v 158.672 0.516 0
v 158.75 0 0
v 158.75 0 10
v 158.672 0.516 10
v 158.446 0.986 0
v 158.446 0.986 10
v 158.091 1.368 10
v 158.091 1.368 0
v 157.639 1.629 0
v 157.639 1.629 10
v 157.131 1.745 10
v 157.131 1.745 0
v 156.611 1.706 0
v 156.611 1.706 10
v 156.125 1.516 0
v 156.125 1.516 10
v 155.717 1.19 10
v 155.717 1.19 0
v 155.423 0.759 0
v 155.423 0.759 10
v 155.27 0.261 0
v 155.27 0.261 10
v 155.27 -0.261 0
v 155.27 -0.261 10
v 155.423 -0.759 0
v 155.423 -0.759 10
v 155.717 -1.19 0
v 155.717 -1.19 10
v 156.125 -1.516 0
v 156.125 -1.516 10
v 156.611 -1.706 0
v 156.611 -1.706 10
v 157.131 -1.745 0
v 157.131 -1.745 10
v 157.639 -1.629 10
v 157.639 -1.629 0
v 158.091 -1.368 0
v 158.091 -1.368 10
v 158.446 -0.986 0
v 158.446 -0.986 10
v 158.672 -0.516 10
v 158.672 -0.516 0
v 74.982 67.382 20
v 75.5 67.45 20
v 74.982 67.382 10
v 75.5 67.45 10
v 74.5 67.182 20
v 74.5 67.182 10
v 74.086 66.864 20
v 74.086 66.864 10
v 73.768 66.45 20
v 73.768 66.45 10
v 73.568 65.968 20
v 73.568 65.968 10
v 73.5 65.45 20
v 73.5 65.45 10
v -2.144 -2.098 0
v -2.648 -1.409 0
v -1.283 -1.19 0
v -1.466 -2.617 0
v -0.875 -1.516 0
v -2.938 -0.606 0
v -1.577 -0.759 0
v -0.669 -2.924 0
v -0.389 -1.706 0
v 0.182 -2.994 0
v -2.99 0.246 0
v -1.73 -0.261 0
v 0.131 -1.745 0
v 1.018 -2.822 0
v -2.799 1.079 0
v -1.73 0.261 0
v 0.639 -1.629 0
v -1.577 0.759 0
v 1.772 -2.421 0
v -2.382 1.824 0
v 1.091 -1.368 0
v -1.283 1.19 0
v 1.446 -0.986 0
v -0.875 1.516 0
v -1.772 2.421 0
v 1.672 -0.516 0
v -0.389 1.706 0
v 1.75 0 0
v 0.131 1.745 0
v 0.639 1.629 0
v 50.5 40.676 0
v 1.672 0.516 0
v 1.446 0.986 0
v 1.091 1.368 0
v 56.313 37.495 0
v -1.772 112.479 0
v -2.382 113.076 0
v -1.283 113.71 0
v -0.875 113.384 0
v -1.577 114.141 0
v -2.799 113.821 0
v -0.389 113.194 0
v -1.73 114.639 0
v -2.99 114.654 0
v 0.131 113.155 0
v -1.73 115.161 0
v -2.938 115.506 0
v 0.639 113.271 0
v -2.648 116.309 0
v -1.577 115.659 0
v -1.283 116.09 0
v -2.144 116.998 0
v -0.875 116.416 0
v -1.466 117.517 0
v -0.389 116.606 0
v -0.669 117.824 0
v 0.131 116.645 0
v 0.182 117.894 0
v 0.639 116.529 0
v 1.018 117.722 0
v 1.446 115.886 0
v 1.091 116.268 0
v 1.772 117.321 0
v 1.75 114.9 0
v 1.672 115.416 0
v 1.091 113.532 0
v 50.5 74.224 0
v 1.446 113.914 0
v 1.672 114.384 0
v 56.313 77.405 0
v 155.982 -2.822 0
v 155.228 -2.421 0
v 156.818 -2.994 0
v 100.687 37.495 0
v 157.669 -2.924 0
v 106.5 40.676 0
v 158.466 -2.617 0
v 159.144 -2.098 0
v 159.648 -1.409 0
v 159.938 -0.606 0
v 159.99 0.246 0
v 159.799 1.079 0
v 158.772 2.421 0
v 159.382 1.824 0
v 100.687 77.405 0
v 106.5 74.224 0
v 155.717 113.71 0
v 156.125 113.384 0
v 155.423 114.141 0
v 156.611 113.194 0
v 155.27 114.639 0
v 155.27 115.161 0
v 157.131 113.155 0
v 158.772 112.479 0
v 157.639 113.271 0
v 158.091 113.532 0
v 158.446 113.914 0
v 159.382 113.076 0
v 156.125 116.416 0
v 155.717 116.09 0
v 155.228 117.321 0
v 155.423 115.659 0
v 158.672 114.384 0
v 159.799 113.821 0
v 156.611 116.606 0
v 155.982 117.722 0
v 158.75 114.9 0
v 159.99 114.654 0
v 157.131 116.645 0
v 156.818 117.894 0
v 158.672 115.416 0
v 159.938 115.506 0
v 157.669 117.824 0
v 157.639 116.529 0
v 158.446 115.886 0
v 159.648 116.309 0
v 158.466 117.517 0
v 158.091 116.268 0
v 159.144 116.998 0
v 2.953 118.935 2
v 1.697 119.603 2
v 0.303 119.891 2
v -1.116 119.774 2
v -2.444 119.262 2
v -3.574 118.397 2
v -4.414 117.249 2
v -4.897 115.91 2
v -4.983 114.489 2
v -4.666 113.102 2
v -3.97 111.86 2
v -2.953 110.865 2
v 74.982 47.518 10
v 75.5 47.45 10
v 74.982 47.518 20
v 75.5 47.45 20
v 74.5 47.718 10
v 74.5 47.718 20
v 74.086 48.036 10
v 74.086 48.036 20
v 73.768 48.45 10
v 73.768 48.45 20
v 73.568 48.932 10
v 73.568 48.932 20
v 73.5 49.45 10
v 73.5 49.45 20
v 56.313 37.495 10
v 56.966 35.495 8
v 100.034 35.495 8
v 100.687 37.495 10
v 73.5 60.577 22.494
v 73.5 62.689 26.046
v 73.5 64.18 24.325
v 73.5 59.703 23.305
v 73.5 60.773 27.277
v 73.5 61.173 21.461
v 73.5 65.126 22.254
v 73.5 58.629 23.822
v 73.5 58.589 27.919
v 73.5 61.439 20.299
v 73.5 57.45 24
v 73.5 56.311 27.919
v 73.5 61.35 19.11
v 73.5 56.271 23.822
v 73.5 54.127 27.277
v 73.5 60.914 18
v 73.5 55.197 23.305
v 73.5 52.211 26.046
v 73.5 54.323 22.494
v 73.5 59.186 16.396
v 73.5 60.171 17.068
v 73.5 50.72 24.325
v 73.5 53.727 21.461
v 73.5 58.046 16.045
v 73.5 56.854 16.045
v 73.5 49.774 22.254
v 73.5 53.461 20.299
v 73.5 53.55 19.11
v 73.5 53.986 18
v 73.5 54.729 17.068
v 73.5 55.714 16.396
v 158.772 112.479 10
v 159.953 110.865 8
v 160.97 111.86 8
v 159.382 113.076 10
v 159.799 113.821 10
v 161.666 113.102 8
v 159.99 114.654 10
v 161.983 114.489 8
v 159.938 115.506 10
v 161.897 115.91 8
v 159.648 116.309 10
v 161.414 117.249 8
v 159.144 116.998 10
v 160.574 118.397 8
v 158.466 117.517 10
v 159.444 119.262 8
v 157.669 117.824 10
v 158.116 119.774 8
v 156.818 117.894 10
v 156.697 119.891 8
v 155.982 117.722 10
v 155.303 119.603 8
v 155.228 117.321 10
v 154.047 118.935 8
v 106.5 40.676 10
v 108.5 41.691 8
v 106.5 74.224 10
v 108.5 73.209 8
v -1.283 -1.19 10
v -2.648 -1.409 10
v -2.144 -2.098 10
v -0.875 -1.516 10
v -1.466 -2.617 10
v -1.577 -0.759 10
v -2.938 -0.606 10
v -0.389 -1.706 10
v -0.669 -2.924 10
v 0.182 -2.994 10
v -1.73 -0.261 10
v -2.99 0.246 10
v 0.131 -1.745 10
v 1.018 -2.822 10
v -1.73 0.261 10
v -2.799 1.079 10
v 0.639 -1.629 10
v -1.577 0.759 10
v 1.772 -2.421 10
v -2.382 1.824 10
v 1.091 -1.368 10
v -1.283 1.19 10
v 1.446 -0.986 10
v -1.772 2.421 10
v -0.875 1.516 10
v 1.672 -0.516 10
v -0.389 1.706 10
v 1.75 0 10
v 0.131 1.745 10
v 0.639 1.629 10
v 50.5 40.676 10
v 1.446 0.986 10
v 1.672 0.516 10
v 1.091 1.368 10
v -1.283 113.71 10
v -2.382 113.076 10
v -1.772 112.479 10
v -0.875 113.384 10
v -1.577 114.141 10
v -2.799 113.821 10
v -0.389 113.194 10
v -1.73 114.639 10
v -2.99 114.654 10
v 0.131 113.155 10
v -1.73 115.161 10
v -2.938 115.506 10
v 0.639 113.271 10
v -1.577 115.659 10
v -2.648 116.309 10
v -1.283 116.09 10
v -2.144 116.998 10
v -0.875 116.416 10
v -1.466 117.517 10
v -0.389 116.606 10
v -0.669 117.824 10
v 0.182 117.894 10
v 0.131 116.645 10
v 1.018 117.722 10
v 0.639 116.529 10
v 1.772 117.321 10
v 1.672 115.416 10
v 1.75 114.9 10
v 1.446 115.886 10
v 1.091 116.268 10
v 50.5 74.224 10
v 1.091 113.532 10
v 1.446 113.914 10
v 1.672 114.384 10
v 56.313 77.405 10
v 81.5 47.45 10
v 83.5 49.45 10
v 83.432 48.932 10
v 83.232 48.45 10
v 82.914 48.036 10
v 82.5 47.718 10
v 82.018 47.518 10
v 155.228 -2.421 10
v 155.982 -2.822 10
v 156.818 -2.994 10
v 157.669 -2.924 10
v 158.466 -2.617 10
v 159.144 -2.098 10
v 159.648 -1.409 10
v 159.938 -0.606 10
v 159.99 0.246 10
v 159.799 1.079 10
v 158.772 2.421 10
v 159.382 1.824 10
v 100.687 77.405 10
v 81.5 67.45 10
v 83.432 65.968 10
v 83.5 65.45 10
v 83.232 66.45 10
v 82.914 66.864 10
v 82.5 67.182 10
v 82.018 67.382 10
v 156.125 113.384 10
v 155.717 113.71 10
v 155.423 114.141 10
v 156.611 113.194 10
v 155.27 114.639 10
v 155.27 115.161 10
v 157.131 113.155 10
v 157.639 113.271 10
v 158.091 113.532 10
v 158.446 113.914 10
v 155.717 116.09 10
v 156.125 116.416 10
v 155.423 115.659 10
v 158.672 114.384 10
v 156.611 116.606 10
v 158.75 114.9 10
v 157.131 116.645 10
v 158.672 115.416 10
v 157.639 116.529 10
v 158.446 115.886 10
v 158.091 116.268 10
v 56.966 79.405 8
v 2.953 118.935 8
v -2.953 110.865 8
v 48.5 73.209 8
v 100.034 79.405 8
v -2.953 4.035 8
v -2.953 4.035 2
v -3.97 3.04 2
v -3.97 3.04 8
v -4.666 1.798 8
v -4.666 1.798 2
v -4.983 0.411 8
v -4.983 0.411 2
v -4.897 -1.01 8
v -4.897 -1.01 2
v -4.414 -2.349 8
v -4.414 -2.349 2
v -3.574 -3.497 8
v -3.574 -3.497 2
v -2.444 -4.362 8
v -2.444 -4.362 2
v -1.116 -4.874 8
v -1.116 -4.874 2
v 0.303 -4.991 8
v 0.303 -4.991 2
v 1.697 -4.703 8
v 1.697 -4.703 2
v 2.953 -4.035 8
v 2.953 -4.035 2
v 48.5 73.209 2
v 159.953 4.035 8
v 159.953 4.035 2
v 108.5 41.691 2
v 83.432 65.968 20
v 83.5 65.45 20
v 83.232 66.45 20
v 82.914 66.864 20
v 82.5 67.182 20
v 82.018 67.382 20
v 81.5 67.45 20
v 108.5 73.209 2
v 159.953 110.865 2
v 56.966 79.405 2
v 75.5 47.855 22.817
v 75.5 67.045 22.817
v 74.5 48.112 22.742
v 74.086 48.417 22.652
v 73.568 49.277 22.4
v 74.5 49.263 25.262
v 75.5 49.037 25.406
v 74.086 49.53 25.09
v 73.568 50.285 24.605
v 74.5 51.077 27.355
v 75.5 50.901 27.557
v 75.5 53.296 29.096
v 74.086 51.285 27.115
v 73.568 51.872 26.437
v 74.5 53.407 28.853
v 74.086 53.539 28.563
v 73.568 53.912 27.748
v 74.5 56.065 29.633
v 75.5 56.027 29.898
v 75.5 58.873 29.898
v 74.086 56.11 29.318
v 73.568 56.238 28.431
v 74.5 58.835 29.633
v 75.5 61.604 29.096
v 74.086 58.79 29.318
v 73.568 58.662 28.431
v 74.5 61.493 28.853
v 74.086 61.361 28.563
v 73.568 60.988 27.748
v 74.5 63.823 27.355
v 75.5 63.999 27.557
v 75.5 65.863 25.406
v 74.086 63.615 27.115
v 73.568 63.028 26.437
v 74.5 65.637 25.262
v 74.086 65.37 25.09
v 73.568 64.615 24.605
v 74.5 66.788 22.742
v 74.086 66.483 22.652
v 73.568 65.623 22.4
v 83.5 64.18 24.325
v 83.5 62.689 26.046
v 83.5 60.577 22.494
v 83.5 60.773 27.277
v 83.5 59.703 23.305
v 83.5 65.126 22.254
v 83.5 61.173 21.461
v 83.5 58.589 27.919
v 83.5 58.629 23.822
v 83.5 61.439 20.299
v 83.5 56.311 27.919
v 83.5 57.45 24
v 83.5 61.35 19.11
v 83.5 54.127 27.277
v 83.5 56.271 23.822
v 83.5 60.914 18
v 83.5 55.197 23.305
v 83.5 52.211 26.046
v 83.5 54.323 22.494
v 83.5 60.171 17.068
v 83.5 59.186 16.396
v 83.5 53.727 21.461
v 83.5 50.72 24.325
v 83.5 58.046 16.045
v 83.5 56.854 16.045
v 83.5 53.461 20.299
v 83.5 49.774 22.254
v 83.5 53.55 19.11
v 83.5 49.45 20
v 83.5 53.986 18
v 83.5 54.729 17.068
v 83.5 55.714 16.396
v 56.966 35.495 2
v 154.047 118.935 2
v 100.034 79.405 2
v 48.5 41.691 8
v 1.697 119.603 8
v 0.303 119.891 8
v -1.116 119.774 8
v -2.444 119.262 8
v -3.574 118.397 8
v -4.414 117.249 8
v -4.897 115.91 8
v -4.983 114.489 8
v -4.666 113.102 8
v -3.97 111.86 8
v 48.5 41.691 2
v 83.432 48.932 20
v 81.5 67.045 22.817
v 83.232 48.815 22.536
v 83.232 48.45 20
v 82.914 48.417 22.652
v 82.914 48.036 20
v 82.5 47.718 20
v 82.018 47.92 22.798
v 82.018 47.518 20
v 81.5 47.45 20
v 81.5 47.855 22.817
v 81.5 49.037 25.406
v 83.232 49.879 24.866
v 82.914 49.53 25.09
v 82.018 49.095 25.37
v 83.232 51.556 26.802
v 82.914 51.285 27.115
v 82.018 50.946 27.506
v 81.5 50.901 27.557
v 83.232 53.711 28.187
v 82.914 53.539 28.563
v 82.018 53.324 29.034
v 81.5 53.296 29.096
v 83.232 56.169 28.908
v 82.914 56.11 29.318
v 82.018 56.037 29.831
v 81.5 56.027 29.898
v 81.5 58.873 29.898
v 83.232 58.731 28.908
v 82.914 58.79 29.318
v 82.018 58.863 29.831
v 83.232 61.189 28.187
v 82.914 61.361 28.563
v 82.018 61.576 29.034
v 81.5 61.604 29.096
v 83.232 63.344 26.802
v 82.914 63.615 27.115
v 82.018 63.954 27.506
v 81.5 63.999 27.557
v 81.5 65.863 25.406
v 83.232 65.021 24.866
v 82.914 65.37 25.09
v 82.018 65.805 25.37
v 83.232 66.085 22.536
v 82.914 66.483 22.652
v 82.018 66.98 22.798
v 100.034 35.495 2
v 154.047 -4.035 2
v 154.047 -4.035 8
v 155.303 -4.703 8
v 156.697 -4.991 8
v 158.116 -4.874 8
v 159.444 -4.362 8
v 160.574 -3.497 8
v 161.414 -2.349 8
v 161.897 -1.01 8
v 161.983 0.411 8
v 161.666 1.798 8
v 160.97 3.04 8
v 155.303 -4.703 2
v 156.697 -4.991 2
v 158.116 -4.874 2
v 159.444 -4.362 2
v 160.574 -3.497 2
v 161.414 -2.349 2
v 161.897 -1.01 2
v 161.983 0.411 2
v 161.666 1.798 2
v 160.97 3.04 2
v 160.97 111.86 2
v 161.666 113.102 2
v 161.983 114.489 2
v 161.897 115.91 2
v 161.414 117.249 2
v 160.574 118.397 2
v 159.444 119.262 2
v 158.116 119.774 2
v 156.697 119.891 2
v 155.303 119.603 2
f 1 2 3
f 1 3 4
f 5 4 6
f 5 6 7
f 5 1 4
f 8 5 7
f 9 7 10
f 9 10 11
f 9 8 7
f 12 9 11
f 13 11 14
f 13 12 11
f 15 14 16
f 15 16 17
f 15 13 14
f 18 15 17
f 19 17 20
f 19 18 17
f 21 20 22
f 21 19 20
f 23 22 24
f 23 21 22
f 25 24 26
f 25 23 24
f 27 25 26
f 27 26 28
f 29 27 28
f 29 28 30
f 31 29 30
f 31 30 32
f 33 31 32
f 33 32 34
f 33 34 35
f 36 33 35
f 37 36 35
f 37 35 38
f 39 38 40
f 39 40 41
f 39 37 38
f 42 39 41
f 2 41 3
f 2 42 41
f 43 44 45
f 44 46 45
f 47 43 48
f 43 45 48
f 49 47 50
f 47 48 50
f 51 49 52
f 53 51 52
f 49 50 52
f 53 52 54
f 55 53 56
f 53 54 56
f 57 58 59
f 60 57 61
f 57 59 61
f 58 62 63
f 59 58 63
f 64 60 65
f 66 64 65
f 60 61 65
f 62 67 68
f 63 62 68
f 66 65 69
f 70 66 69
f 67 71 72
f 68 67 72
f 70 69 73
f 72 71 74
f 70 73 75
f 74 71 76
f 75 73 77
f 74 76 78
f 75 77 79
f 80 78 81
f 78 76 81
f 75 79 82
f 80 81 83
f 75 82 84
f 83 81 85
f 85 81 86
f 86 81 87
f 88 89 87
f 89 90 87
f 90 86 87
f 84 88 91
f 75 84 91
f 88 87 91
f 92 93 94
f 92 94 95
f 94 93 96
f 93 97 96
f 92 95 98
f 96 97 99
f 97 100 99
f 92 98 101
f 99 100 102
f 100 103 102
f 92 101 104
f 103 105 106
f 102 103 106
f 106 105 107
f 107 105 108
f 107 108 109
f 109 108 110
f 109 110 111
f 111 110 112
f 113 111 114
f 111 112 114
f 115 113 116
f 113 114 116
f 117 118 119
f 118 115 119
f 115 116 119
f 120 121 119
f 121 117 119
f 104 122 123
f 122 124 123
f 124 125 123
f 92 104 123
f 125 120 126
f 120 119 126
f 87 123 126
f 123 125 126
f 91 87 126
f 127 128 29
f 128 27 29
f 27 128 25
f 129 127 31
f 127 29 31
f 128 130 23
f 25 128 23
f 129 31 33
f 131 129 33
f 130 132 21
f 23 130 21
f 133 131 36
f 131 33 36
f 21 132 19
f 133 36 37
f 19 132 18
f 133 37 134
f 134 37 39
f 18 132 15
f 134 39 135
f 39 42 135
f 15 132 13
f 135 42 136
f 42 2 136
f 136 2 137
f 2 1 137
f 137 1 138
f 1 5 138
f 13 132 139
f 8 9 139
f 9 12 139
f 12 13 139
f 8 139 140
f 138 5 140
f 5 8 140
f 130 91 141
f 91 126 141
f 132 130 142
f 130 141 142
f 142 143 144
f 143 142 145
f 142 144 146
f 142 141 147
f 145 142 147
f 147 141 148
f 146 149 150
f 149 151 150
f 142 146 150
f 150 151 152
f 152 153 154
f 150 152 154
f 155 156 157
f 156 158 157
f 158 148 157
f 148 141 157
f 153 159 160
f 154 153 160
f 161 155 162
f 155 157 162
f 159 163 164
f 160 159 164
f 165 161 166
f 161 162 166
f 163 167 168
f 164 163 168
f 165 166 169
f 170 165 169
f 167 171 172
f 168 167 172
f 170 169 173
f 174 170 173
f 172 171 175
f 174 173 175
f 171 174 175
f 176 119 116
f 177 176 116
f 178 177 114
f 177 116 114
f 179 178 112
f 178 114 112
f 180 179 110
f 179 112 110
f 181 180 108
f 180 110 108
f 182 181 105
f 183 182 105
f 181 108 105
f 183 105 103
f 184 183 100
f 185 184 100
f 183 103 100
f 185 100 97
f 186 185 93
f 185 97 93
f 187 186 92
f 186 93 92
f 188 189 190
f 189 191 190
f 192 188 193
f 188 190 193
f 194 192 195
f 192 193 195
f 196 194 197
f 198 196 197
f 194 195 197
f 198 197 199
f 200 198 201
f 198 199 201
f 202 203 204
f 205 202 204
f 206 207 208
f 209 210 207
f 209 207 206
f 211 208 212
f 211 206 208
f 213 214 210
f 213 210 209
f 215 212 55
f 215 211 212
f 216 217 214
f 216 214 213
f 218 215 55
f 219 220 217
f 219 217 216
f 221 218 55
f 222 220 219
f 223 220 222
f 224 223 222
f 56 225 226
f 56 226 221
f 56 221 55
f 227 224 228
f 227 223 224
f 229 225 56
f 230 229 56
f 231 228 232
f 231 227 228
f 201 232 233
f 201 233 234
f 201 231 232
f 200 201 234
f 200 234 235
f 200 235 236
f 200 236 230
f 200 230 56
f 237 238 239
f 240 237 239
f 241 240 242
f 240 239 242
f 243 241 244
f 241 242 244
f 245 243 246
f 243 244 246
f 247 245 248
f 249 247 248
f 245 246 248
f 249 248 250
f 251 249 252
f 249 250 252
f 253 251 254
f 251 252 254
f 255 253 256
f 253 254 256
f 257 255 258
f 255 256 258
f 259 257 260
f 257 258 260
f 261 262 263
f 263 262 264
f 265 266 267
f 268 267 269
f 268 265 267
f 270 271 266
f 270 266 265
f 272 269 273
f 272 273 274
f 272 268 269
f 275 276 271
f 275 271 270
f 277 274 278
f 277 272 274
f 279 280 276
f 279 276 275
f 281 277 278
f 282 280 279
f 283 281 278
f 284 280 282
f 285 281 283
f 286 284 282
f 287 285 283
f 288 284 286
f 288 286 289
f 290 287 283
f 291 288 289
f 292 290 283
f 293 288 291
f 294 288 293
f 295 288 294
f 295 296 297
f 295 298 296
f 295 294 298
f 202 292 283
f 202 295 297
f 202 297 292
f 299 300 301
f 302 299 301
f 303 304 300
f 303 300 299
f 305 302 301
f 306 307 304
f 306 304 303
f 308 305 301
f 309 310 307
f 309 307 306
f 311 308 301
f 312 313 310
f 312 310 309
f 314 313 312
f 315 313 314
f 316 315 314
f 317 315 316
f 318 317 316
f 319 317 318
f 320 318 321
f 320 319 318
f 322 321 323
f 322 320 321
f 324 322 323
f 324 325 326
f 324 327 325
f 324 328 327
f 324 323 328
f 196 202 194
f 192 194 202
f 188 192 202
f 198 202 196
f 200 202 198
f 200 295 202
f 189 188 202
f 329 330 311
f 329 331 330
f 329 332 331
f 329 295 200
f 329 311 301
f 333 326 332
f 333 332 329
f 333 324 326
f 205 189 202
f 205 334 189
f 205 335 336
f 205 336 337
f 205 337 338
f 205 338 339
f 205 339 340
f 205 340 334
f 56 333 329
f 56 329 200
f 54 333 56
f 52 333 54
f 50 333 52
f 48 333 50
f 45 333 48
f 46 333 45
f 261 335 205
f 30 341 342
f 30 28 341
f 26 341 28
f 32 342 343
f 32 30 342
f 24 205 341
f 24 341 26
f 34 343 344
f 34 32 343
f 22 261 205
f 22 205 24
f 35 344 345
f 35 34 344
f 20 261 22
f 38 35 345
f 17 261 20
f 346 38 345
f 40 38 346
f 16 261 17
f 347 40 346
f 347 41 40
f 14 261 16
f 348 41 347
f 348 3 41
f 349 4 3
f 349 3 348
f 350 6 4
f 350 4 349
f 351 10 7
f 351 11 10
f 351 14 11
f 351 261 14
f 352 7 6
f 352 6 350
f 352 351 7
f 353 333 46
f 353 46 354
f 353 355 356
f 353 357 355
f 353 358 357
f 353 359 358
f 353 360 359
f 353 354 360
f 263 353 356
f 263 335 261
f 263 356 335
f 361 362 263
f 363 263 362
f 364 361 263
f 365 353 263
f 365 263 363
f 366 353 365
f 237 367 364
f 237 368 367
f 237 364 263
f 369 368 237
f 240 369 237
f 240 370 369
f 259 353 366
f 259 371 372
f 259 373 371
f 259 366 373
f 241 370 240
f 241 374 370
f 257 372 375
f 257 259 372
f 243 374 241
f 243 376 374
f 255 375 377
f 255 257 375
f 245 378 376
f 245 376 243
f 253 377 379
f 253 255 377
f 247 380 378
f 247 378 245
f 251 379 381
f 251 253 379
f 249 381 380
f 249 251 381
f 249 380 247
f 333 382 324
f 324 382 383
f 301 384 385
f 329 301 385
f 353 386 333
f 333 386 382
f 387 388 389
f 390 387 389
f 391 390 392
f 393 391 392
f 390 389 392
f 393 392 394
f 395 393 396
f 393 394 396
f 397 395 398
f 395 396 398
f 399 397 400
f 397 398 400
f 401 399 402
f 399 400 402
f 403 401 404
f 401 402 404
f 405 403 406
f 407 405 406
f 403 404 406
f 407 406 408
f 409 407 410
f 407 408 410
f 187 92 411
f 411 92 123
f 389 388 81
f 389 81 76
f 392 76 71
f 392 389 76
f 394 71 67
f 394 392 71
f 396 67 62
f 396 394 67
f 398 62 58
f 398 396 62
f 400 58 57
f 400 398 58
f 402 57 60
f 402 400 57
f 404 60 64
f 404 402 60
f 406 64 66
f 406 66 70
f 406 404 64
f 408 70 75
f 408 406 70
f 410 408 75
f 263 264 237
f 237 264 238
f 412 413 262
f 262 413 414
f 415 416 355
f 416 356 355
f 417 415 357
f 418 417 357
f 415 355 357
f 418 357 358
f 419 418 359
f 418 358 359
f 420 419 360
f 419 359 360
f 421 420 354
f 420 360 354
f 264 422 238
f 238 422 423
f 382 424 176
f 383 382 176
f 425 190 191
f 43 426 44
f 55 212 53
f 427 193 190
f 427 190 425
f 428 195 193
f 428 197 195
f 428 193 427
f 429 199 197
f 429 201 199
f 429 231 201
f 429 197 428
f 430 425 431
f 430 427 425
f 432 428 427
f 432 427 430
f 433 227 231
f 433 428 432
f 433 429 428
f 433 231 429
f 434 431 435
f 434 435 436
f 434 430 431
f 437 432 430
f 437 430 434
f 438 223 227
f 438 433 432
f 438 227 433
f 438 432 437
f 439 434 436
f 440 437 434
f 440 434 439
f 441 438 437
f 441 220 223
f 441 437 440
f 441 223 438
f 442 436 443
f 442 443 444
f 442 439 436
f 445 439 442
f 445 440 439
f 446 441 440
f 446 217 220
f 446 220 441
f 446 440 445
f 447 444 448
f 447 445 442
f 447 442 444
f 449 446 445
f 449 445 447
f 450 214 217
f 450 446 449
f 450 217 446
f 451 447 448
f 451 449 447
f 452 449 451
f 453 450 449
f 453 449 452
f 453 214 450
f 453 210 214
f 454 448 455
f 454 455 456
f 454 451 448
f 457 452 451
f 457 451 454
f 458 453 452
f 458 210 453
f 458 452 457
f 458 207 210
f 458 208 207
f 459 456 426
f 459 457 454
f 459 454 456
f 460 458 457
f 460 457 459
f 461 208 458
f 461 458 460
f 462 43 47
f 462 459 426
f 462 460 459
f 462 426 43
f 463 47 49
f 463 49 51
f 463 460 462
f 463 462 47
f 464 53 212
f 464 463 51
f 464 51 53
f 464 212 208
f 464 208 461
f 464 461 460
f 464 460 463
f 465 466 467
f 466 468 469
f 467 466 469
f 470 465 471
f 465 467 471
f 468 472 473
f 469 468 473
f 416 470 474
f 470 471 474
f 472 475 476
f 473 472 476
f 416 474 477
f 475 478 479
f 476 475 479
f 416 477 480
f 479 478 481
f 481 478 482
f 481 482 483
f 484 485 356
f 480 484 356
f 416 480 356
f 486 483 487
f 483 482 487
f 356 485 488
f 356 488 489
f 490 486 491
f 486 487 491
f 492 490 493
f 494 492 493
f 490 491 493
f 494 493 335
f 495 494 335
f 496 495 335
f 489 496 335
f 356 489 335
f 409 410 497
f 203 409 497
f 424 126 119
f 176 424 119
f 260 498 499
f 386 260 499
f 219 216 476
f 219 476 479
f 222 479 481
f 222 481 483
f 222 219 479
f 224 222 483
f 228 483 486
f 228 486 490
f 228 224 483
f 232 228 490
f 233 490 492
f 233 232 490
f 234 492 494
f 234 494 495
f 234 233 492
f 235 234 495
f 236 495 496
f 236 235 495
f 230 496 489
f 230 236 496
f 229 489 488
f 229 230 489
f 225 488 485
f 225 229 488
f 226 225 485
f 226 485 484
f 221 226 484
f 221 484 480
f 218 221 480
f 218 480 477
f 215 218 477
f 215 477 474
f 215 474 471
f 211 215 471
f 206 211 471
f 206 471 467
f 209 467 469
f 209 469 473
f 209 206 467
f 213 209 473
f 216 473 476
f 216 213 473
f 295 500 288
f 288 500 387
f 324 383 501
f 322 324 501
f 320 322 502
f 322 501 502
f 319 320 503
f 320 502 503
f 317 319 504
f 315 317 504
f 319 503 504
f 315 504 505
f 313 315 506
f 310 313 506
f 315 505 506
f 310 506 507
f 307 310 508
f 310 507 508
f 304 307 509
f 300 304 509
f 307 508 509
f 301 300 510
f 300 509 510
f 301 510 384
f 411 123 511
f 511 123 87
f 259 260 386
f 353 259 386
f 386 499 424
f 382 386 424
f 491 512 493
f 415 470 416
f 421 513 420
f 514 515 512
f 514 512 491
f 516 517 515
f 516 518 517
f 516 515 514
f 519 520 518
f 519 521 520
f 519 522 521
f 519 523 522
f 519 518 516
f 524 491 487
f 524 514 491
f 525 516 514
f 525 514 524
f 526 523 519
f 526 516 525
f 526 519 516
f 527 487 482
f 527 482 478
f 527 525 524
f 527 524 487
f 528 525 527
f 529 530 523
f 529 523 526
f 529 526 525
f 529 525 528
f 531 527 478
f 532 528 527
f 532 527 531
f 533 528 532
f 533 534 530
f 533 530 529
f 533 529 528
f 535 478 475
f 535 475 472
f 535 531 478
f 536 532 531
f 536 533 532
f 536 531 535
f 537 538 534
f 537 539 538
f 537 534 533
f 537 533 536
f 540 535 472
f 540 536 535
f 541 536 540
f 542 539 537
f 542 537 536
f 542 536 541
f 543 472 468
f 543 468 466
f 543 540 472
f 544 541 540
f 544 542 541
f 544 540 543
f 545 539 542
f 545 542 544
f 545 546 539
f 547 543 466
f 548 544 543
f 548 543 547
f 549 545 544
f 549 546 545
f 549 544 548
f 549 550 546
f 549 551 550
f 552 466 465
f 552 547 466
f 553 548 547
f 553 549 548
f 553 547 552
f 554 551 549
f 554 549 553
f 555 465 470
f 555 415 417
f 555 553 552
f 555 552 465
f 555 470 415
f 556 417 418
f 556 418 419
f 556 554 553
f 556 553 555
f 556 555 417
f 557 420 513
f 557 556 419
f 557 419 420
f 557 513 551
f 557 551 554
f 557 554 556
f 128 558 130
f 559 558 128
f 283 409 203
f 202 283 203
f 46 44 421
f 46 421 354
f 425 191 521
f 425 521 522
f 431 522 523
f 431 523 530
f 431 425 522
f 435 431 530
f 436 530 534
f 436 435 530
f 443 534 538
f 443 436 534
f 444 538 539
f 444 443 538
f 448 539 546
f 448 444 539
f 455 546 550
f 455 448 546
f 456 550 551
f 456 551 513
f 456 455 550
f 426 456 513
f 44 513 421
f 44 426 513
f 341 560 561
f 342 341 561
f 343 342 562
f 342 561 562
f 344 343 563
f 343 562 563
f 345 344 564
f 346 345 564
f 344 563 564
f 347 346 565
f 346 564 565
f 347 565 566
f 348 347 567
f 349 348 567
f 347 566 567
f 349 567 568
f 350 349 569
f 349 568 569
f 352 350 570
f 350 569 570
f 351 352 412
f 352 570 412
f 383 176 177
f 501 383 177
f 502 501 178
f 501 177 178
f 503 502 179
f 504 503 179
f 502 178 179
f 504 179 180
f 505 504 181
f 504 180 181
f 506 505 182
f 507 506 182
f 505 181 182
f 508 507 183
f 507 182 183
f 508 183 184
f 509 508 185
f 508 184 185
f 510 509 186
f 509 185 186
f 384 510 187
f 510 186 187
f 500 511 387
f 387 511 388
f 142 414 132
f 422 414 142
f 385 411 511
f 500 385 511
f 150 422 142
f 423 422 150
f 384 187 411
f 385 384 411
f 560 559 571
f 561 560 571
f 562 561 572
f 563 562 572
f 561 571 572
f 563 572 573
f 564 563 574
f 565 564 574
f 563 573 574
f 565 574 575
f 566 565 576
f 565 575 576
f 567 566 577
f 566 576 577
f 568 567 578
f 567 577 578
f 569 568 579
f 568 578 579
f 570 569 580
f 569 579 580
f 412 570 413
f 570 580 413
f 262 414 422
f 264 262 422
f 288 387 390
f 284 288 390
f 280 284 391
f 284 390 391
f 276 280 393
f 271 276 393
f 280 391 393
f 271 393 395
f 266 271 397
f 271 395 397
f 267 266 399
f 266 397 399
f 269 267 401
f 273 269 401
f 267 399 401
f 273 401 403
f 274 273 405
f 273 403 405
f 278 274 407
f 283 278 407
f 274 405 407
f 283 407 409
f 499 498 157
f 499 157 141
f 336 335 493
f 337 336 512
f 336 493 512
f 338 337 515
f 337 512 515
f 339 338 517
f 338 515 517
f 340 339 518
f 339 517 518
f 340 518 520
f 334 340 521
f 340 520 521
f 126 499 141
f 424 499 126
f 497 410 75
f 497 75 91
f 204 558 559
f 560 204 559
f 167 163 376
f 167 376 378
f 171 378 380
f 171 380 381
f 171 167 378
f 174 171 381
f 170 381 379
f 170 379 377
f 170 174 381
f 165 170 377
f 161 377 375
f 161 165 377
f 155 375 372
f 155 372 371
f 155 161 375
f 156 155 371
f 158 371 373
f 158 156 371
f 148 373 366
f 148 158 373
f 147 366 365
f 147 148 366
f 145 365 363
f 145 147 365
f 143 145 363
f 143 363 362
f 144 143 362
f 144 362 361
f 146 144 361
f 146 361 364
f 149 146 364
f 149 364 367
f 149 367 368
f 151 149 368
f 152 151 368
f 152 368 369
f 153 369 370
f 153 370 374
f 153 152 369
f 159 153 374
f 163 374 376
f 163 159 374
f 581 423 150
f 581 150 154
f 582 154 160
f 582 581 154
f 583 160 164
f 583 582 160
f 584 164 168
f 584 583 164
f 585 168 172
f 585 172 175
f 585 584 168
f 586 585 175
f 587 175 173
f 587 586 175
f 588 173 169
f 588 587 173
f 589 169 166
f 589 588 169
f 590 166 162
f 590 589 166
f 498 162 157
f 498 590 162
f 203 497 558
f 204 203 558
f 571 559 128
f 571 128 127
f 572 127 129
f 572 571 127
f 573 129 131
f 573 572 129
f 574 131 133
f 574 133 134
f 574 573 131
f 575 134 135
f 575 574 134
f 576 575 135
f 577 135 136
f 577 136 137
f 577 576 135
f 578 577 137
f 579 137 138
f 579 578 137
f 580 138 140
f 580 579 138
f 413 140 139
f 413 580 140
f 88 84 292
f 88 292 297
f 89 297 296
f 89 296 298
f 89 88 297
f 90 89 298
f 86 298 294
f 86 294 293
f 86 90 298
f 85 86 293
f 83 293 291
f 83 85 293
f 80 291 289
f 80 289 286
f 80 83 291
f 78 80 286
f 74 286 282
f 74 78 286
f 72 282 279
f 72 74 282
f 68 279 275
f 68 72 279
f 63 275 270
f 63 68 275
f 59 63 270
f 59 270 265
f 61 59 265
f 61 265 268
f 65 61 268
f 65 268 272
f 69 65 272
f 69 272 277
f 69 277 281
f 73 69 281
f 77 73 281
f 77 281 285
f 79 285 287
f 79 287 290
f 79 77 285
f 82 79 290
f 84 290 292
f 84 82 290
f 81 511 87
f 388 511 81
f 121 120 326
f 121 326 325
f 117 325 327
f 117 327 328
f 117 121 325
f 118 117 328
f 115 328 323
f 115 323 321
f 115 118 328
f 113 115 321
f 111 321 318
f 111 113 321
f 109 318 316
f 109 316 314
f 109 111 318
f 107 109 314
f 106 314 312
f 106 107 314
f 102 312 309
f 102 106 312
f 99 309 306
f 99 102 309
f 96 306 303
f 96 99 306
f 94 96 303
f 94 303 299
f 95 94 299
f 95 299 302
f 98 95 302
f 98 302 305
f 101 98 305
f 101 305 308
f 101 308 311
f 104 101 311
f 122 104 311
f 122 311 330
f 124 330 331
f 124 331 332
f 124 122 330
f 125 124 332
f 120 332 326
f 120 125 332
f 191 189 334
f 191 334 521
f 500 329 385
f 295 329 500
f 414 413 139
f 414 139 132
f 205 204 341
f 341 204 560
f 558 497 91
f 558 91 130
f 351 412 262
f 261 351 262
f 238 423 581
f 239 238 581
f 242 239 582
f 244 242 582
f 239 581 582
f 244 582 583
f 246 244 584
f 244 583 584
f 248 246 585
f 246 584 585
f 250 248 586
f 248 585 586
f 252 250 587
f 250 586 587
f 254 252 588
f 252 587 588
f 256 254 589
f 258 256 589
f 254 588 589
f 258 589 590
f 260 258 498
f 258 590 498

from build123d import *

# Parameters (mm, degrees)
ESQUISSE1_R        = 1.75
BOSS_EXTRU_1_DEPTH = 10
BOSS_EXTRU_2_START = 25
ESQUISSE2_R        = 4
BOSS_EXTRU_2_DEPTH = 10
CHANFREIN1_SIZE    = 2
CONG_1_R           = 2


with BuildPart() as part:
    # Esquisse1 → Boss.-Extru.1 (new body)
    with BuildSketch(Plane.XY):
        with BuildLine():
            Line((-2.952917385, 110.865117237), (48.5, 73.209447125))
            Line((48.5, 73.209447125), (48.5, 41.690552875))
            Line((48.5, 41.690552875), (-2.952917385, 4.034882763))
            ThreePointArc((-2.952917385, 4.034882763), (-4.034882763, -2.952917385), (2.952917385, -4.034882763))
            Line((2.952917385, -4.034882763), (56.966203668, 35.494585987))
            Line((56.966203668, 35.494585987), (100.033796332, 35.494585987))
            Line((100.033796332, 35.494585987), (154.047082615, -4.034882763))
            ThreePointArc((154.047082615, -4.034882763), (161.034882763, -2.952917385), (159.952917385, 4.034882763))
            Line((159.952917385, 4.034882763), (108.5, 41.690552875))
            Line((108.5, 41.690552875), (108.5, 73.209447125))
            Line((108.5, 73.209447125), (159.952917385, 110.865117237))
            ThreePointArc((159.952917385, 110.865117237), (161.034882763, 117.852917385), (154.047082615, 118.934882763))
            Line((154.047082615, 118.934882763), (100.033796332, 79.405414013))
            Line((100.033796332, 79.405414013), (56.966203668, 79.405414013))
            Line((56.966203668, 79.405414013), (2.952917385, 118.934882763))
            ThreePointArc((2.952917385, 118.934882763), (-4.034882763, 117.852917385), (-2.952917385, 110.865117237))
        make_face()
        Circle(ESQUISSE1_R, mode=Mode.SUBTRACT)
        with Locations((0, 114.9)):
            Circle(ESQUISSE1_R, mode=Mode.SUBTRACT)
        with Locations((157, 0)):
            Circle(ESQUISSE1_R, mode=Mode.SUBTRACT)
        with Locations((157, 114.9)):
            Circle(ESQUISSE1_R, mode=Mode.SUBTRACT)
    extrude(amount=BOSS_EXTRU_1_DEPTH)

    # Esquisse2 → Boss.-Extru.2 (add)
    with BuildSketch(Plane(origin=(48.5, 158.810828025, 0), x_dir=(0, 0, 1), z_dir=(1, 0, 0)).offset(BOSS_EXTRU_2_START)):
        with BuildLine():
            Line((10, 111.360828025), (20, 111.360828025))
            ThreePointArc((20, 111.360828025), (30, 101.360828025), (20, 91.360828025))
            Line((20, 91.360828025), (10, 91.360828025))
            Line((10, 91.360828025), (10, 111.360828025))
        make_face()
        with Locations((20, 101.360828025)):
            Circle(ESQUISSE2_R, mode=Mode.SUBTRACT)
    extrude(amount=BOSS_EXTRU_2_DEPTH)

    # Chanfrein1
    chanfrein1_edges = [part.edges().sort_by_distance(p)[0] for p in [
        (134.226458693, 92.037282181, 10),
        (161.034882763, -2.952917385, 0),
        (127.040439473, 15.729851612, 0),
        (78.5, 35.494585987, 0),
        (161.034882763, 117.852917385, 10),
        (29.959560527, 15.729851612, 0),
        (-4.034882763, -2.952917385, 0),
        (22.773541307, 22.862717819, 0),
        (48.5, 57.45, 0),
        (22.773541307, 92.037282181, 0),
        (-4.034882763, 117.852917385, 0),
        (29.959560527, 99.170148388, 0),
        (78.5, 79.405414013, 0),
        (127.040439473, 99.170148388, 0),
        (161.034882763, 117.852917385, 0),
        (127.040439473, 99.170148388, 10),
        (134.226458693, 92.037282181, 0),
        (108.5, 57.45, 0),
        (134.226458693, 22.862717819, 0),
        (78.5, 79.405414013, 10),
        (29.959560527, 99.170148388, 10),
        (-4.034882763, 117.852917385, 10),
        (22.773541307, 92.037282181, 10),
        (48.5, 57.45, 10),
        (22.773541307, 22.862717819, 10),
        (-4.034882763, -2.952917385, 10),
        (134.226458693, 22.862717819, 10),
        (29.959560527, 15.729851612, 10),
        (78.5, 35.494585987, 10),
        (127.040439473, 15.729851612, 10),
        (161.034882763, -2.952917385, 10),
        (108.5, 57.45, 10),
    ]]
    chamfer(chanfrein1_edges, length=CHANFREIN1_SIZE)

    # Congé1
    cong_1_edges = [part.edges().sort_by_distance(p)[0] for p in [
        (83.5, 67.45, 15),
        (83.5, 57.45, 30),
        (83.5, 47.45, 15),
        (73.5, 67.45, 15),
        (73.5, 57.45, 30),
        (73.5, 47.45, 15),
    ]]
    fillet(cong_1_edges, radius=CONG_1_R)


solid = part.part
